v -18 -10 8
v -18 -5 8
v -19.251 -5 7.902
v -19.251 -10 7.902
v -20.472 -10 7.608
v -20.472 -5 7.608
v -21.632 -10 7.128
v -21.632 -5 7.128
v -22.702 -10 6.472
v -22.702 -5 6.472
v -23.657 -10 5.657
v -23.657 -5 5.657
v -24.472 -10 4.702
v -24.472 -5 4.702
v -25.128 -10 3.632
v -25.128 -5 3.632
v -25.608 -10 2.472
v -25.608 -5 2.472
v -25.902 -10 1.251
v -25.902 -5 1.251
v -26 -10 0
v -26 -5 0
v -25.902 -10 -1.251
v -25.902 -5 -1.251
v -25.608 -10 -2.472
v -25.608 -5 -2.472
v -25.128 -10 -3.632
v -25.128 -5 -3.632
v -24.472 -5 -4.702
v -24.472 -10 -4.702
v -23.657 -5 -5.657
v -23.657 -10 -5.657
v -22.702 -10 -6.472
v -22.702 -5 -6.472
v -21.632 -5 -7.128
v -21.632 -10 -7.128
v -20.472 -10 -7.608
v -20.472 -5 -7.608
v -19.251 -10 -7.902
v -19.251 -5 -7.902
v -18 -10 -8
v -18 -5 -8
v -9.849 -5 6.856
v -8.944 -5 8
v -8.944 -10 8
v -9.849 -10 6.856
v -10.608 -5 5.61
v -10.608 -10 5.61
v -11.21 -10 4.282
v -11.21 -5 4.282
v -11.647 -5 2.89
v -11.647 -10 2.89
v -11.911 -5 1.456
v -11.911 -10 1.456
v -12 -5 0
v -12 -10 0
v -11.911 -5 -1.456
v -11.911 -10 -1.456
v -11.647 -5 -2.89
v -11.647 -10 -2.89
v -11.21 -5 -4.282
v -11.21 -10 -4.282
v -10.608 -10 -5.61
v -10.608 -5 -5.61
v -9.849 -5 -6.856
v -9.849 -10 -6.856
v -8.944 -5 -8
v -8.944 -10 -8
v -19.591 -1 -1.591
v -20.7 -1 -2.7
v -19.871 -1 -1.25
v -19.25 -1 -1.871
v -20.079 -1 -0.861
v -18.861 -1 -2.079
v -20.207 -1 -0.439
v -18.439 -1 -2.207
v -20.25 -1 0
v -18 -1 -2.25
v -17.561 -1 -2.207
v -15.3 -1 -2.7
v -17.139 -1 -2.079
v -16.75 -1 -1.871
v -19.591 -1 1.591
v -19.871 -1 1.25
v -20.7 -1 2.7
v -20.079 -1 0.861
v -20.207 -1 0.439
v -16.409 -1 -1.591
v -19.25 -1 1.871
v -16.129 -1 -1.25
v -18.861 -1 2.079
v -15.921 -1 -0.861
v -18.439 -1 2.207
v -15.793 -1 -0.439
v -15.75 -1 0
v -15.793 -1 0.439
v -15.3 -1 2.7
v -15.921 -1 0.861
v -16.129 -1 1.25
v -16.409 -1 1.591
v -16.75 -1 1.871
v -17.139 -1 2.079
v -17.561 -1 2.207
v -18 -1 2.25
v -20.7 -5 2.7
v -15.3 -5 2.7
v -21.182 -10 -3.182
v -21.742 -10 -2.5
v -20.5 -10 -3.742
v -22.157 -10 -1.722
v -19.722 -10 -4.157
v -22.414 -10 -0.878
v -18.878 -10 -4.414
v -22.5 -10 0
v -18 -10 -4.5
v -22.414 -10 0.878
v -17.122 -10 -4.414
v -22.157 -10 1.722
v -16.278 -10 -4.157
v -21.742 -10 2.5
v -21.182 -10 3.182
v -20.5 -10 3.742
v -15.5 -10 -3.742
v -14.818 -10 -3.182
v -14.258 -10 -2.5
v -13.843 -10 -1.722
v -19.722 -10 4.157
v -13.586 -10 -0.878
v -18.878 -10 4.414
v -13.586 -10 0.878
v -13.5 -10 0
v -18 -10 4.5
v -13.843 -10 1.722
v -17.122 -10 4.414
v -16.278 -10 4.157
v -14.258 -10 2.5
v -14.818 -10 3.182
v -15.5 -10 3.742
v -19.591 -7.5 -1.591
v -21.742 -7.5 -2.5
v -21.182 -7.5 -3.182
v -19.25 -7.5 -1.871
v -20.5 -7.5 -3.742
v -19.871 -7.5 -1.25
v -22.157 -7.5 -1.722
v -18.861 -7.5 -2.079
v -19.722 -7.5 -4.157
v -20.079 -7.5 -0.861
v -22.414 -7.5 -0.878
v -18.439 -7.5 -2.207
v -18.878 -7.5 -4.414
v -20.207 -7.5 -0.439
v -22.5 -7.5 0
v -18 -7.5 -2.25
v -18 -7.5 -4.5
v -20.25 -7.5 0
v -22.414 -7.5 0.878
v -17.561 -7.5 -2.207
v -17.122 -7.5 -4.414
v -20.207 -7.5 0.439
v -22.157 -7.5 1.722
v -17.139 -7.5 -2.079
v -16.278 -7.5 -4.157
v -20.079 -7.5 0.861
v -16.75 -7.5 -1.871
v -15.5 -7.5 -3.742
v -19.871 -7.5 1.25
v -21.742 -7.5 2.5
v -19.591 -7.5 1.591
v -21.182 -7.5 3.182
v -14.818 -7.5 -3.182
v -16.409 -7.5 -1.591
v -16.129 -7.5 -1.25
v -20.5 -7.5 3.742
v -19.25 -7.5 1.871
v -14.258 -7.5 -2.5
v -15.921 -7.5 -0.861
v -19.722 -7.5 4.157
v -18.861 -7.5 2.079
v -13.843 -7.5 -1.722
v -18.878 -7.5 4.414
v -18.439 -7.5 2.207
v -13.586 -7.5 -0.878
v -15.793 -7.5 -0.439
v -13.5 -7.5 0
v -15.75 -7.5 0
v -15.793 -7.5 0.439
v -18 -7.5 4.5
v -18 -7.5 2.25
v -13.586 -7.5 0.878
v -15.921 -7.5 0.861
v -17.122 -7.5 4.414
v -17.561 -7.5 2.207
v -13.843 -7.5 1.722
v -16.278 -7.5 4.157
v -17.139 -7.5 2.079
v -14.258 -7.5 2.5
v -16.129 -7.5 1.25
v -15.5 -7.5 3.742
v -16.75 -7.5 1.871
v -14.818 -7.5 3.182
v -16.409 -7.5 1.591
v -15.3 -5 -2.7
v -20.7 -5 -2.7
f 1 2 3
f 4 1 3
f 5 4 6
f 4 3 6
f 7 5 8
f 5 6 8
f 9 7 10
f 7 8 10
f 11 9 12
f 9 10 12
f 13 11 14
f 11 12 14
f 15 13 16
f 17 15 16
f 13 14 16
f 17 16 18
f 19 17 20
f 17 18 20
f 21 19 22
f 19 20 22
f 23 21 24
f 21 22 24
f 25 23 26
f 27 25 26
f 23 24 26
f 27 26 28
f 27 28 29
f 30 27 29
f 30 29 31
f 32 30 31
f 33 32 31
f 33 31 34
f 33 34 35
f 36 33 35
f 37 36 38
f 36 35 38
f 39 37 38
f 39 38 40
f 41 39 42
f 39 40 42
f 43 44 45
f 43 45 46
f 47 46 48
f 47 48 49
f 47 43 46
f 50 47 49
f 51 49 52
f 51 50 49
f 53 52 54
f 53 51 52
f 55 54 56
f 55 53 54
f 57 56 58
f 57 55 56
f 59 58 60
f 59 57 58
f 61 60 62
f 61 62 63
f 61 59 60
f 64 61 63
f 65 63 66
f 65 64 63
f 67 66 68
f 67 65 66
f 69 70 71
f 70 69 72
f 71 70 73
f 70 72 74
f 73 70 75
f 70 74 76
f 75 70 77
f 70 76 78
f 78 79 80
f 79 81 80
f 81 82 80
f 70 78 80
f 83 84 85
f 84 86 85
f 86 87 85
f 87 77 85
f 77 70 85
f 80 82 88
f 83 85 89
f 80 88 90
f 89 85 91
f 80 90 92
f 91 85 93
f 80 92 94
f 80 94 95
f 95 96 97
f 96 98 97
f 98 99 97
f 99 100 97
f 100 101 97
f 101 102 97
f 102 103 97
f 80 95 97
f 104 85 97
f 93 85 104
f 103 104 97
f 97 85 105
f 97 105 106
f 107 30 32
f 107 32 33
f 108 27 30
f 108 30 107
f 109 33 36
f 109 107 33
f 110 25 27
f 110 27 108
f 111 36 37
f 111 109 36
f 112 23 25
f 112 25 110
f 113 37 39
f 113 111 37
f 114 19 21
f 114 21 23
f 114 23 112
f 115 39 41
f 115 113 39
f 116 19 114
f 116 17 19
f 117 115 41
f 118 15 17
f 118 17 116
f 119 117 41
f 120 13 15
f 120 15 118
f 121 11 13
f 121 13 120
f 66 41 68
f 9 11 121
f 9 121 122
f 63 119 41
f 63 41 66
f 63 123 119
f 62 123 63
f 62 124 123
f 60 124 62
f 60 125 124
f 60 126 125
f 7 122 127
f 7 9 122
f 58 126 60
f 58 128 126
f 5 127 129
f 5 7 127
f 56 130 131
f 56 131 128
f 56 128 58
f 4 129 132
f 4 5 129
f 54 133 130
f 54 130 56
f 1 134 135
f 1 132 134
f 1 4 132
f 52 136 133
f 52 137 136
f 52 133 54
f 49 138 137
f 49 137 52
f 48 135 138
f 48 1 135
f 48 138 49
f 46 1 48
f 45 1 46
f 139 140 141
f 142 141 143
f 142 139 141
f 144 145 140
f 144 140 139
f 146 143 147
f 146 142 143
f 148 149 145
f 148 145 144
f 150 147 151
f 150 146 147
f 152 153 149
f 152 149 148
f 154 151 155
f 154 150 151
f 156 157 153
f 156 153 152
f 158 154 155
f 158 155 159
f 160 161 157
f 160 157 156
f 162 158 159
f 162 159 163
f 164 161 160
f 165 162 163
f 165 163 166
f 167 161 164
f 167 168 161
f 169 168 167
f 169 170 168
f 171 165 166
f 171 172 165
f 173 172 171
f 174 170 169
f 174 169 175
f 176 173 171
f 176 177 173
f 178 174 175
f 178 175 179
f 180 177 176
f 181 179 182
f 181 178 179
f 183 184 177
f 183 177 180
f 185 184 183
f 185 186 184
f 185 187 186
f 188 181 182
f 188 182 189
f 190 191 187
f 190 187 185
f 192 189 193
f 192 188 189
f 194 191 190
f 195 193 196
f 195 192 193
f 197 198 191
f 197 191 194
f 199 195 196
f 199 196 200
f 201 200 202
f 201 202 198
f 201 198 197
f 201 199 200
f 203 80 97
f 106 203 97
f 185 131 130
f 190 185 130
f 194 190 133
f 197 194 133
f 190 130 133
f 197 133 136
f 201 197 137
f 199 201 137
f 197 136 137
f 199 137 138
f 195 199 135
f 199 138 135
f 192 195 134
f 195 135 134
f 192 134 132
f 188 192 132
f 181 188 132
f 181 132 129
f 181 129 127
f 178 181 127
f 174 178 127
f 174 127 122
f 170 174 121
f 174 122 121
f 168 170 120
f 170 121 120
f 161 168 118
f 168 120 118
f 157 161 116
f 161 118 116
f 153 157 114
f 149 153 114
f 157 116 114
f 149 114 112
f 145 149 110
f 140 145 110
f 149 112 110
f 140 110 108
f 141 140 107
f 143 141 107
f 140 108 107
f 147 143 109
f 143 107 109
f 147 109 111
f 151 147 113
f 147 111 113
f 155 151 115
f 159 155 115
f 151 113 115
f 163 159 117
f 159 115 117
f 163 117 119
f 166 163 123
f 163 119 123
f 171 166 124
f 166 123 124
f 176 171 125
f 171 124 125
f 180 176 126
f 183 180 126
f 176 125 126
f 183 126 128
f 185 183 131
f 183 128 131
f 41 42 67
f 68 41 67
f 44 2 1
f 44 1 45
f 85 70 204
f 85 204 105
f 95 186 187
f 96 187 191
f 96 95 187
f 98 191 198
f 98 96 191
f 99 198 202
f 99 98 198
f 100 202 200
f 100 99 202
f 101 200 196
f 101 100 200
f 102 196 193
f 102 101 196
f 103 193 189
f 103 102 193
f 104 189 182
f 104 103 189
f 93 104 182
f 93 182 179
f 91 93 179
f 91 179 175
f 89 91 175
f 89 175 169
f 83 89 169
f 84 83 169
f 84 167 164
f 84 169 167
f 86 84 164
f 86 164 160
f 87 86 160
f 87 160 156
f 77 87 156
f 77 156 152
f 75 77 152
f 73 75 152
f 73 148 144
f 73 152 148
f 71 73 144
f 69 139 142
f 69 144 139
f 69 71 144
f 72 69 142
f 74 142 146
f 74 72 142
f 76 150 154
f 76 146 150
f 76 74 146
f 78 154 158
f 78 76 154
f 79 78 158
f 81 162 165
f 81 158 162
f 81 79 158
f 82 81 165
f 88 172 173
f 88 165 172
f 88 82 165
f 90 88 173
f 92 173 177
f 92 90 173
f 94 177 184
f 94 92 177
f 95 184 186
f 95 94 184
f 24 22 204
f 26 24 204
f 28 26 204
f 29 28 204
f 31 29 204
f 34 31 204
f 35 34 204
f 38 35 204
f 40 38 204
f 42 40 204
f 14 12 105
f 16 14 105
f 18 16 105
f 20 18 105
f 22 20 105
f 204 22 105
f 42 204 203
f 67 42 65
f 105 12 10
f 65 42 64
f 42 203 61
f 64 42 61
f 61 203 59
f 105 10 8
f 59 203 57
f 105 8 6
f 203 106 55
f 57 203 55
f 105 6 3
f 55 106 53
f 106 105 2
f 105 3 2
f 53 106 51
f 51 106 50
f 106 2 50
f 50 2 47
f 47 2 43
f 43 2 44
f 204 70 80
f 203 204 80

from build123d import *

# Parameters (mm, degrees)
PAD021_DEPTH      = 5
BOX002_W          = 5.4
BOX002_H          = 5.4
BOX002_DEPTH      = 4
CYLINDER063_R     = 2.25
CYLINDER063_DEPTH = 9
SKETCH034_R       = 4.5
POCKET004_DEPTH   = 2.5


with BuildPart() as part:
    # Sketch031 → Pad021 (new body)
    with BuildSketch(Plane.XZ):
        with BuildLine():
            ThreePointArc((-18, 8), (-26, 0), (-18, -8))
            Line((-18, -8), (-8.944272, -8))
            ThreePointArc((-8.944272, 8), (-12, 0), (-8.944272, -8))
            Line((-18, 8), (-8.944272, 8))
        make_face()
    extrude(amount=PAD021_DEPTH)

    # Box002 → Box002 (join)
    with BuildSketch(Plane(origin=(-20.7, 4, -2.7), x_dir=(1, 0, 0), z_dir=(0, -1, 0))):
        with Locations((2.7, 2.7)):
            Rectangle(BOX002_W, BOX002_H)
    extrude(amount=BOX002_DEPTH)

    # Cylinder063 → Cylinder063 (cut)
    with BuildSketch(Plane(origin=(-18, 4, 0), x_dir=(1, 0, 0), z_dir=(0, -1, 0))):
        Circle(CYLINDER063_R)
    extrude(amount=CYLINDER063_DEPTH, mode=Mode.SUBTRACT)

    # Sketch034 (on Face5 of Cylinder063) → Pocket004 (cut)
    with BuildSketch(Plane(origin=(-18, -5, 0), x_dir=(1, 0, 0), z_dir=(0, -1, 0))):
        Circle(SKETCH034_R)
    extrude(amount=-POCKET004_DEPTH, mode=Mode.SUBTRACT)


with BuildPart() as part_1:
    # Body033 placement: moved
    add(part.part.moved(Location((0, -5, 0))))


solid = part_1.part
